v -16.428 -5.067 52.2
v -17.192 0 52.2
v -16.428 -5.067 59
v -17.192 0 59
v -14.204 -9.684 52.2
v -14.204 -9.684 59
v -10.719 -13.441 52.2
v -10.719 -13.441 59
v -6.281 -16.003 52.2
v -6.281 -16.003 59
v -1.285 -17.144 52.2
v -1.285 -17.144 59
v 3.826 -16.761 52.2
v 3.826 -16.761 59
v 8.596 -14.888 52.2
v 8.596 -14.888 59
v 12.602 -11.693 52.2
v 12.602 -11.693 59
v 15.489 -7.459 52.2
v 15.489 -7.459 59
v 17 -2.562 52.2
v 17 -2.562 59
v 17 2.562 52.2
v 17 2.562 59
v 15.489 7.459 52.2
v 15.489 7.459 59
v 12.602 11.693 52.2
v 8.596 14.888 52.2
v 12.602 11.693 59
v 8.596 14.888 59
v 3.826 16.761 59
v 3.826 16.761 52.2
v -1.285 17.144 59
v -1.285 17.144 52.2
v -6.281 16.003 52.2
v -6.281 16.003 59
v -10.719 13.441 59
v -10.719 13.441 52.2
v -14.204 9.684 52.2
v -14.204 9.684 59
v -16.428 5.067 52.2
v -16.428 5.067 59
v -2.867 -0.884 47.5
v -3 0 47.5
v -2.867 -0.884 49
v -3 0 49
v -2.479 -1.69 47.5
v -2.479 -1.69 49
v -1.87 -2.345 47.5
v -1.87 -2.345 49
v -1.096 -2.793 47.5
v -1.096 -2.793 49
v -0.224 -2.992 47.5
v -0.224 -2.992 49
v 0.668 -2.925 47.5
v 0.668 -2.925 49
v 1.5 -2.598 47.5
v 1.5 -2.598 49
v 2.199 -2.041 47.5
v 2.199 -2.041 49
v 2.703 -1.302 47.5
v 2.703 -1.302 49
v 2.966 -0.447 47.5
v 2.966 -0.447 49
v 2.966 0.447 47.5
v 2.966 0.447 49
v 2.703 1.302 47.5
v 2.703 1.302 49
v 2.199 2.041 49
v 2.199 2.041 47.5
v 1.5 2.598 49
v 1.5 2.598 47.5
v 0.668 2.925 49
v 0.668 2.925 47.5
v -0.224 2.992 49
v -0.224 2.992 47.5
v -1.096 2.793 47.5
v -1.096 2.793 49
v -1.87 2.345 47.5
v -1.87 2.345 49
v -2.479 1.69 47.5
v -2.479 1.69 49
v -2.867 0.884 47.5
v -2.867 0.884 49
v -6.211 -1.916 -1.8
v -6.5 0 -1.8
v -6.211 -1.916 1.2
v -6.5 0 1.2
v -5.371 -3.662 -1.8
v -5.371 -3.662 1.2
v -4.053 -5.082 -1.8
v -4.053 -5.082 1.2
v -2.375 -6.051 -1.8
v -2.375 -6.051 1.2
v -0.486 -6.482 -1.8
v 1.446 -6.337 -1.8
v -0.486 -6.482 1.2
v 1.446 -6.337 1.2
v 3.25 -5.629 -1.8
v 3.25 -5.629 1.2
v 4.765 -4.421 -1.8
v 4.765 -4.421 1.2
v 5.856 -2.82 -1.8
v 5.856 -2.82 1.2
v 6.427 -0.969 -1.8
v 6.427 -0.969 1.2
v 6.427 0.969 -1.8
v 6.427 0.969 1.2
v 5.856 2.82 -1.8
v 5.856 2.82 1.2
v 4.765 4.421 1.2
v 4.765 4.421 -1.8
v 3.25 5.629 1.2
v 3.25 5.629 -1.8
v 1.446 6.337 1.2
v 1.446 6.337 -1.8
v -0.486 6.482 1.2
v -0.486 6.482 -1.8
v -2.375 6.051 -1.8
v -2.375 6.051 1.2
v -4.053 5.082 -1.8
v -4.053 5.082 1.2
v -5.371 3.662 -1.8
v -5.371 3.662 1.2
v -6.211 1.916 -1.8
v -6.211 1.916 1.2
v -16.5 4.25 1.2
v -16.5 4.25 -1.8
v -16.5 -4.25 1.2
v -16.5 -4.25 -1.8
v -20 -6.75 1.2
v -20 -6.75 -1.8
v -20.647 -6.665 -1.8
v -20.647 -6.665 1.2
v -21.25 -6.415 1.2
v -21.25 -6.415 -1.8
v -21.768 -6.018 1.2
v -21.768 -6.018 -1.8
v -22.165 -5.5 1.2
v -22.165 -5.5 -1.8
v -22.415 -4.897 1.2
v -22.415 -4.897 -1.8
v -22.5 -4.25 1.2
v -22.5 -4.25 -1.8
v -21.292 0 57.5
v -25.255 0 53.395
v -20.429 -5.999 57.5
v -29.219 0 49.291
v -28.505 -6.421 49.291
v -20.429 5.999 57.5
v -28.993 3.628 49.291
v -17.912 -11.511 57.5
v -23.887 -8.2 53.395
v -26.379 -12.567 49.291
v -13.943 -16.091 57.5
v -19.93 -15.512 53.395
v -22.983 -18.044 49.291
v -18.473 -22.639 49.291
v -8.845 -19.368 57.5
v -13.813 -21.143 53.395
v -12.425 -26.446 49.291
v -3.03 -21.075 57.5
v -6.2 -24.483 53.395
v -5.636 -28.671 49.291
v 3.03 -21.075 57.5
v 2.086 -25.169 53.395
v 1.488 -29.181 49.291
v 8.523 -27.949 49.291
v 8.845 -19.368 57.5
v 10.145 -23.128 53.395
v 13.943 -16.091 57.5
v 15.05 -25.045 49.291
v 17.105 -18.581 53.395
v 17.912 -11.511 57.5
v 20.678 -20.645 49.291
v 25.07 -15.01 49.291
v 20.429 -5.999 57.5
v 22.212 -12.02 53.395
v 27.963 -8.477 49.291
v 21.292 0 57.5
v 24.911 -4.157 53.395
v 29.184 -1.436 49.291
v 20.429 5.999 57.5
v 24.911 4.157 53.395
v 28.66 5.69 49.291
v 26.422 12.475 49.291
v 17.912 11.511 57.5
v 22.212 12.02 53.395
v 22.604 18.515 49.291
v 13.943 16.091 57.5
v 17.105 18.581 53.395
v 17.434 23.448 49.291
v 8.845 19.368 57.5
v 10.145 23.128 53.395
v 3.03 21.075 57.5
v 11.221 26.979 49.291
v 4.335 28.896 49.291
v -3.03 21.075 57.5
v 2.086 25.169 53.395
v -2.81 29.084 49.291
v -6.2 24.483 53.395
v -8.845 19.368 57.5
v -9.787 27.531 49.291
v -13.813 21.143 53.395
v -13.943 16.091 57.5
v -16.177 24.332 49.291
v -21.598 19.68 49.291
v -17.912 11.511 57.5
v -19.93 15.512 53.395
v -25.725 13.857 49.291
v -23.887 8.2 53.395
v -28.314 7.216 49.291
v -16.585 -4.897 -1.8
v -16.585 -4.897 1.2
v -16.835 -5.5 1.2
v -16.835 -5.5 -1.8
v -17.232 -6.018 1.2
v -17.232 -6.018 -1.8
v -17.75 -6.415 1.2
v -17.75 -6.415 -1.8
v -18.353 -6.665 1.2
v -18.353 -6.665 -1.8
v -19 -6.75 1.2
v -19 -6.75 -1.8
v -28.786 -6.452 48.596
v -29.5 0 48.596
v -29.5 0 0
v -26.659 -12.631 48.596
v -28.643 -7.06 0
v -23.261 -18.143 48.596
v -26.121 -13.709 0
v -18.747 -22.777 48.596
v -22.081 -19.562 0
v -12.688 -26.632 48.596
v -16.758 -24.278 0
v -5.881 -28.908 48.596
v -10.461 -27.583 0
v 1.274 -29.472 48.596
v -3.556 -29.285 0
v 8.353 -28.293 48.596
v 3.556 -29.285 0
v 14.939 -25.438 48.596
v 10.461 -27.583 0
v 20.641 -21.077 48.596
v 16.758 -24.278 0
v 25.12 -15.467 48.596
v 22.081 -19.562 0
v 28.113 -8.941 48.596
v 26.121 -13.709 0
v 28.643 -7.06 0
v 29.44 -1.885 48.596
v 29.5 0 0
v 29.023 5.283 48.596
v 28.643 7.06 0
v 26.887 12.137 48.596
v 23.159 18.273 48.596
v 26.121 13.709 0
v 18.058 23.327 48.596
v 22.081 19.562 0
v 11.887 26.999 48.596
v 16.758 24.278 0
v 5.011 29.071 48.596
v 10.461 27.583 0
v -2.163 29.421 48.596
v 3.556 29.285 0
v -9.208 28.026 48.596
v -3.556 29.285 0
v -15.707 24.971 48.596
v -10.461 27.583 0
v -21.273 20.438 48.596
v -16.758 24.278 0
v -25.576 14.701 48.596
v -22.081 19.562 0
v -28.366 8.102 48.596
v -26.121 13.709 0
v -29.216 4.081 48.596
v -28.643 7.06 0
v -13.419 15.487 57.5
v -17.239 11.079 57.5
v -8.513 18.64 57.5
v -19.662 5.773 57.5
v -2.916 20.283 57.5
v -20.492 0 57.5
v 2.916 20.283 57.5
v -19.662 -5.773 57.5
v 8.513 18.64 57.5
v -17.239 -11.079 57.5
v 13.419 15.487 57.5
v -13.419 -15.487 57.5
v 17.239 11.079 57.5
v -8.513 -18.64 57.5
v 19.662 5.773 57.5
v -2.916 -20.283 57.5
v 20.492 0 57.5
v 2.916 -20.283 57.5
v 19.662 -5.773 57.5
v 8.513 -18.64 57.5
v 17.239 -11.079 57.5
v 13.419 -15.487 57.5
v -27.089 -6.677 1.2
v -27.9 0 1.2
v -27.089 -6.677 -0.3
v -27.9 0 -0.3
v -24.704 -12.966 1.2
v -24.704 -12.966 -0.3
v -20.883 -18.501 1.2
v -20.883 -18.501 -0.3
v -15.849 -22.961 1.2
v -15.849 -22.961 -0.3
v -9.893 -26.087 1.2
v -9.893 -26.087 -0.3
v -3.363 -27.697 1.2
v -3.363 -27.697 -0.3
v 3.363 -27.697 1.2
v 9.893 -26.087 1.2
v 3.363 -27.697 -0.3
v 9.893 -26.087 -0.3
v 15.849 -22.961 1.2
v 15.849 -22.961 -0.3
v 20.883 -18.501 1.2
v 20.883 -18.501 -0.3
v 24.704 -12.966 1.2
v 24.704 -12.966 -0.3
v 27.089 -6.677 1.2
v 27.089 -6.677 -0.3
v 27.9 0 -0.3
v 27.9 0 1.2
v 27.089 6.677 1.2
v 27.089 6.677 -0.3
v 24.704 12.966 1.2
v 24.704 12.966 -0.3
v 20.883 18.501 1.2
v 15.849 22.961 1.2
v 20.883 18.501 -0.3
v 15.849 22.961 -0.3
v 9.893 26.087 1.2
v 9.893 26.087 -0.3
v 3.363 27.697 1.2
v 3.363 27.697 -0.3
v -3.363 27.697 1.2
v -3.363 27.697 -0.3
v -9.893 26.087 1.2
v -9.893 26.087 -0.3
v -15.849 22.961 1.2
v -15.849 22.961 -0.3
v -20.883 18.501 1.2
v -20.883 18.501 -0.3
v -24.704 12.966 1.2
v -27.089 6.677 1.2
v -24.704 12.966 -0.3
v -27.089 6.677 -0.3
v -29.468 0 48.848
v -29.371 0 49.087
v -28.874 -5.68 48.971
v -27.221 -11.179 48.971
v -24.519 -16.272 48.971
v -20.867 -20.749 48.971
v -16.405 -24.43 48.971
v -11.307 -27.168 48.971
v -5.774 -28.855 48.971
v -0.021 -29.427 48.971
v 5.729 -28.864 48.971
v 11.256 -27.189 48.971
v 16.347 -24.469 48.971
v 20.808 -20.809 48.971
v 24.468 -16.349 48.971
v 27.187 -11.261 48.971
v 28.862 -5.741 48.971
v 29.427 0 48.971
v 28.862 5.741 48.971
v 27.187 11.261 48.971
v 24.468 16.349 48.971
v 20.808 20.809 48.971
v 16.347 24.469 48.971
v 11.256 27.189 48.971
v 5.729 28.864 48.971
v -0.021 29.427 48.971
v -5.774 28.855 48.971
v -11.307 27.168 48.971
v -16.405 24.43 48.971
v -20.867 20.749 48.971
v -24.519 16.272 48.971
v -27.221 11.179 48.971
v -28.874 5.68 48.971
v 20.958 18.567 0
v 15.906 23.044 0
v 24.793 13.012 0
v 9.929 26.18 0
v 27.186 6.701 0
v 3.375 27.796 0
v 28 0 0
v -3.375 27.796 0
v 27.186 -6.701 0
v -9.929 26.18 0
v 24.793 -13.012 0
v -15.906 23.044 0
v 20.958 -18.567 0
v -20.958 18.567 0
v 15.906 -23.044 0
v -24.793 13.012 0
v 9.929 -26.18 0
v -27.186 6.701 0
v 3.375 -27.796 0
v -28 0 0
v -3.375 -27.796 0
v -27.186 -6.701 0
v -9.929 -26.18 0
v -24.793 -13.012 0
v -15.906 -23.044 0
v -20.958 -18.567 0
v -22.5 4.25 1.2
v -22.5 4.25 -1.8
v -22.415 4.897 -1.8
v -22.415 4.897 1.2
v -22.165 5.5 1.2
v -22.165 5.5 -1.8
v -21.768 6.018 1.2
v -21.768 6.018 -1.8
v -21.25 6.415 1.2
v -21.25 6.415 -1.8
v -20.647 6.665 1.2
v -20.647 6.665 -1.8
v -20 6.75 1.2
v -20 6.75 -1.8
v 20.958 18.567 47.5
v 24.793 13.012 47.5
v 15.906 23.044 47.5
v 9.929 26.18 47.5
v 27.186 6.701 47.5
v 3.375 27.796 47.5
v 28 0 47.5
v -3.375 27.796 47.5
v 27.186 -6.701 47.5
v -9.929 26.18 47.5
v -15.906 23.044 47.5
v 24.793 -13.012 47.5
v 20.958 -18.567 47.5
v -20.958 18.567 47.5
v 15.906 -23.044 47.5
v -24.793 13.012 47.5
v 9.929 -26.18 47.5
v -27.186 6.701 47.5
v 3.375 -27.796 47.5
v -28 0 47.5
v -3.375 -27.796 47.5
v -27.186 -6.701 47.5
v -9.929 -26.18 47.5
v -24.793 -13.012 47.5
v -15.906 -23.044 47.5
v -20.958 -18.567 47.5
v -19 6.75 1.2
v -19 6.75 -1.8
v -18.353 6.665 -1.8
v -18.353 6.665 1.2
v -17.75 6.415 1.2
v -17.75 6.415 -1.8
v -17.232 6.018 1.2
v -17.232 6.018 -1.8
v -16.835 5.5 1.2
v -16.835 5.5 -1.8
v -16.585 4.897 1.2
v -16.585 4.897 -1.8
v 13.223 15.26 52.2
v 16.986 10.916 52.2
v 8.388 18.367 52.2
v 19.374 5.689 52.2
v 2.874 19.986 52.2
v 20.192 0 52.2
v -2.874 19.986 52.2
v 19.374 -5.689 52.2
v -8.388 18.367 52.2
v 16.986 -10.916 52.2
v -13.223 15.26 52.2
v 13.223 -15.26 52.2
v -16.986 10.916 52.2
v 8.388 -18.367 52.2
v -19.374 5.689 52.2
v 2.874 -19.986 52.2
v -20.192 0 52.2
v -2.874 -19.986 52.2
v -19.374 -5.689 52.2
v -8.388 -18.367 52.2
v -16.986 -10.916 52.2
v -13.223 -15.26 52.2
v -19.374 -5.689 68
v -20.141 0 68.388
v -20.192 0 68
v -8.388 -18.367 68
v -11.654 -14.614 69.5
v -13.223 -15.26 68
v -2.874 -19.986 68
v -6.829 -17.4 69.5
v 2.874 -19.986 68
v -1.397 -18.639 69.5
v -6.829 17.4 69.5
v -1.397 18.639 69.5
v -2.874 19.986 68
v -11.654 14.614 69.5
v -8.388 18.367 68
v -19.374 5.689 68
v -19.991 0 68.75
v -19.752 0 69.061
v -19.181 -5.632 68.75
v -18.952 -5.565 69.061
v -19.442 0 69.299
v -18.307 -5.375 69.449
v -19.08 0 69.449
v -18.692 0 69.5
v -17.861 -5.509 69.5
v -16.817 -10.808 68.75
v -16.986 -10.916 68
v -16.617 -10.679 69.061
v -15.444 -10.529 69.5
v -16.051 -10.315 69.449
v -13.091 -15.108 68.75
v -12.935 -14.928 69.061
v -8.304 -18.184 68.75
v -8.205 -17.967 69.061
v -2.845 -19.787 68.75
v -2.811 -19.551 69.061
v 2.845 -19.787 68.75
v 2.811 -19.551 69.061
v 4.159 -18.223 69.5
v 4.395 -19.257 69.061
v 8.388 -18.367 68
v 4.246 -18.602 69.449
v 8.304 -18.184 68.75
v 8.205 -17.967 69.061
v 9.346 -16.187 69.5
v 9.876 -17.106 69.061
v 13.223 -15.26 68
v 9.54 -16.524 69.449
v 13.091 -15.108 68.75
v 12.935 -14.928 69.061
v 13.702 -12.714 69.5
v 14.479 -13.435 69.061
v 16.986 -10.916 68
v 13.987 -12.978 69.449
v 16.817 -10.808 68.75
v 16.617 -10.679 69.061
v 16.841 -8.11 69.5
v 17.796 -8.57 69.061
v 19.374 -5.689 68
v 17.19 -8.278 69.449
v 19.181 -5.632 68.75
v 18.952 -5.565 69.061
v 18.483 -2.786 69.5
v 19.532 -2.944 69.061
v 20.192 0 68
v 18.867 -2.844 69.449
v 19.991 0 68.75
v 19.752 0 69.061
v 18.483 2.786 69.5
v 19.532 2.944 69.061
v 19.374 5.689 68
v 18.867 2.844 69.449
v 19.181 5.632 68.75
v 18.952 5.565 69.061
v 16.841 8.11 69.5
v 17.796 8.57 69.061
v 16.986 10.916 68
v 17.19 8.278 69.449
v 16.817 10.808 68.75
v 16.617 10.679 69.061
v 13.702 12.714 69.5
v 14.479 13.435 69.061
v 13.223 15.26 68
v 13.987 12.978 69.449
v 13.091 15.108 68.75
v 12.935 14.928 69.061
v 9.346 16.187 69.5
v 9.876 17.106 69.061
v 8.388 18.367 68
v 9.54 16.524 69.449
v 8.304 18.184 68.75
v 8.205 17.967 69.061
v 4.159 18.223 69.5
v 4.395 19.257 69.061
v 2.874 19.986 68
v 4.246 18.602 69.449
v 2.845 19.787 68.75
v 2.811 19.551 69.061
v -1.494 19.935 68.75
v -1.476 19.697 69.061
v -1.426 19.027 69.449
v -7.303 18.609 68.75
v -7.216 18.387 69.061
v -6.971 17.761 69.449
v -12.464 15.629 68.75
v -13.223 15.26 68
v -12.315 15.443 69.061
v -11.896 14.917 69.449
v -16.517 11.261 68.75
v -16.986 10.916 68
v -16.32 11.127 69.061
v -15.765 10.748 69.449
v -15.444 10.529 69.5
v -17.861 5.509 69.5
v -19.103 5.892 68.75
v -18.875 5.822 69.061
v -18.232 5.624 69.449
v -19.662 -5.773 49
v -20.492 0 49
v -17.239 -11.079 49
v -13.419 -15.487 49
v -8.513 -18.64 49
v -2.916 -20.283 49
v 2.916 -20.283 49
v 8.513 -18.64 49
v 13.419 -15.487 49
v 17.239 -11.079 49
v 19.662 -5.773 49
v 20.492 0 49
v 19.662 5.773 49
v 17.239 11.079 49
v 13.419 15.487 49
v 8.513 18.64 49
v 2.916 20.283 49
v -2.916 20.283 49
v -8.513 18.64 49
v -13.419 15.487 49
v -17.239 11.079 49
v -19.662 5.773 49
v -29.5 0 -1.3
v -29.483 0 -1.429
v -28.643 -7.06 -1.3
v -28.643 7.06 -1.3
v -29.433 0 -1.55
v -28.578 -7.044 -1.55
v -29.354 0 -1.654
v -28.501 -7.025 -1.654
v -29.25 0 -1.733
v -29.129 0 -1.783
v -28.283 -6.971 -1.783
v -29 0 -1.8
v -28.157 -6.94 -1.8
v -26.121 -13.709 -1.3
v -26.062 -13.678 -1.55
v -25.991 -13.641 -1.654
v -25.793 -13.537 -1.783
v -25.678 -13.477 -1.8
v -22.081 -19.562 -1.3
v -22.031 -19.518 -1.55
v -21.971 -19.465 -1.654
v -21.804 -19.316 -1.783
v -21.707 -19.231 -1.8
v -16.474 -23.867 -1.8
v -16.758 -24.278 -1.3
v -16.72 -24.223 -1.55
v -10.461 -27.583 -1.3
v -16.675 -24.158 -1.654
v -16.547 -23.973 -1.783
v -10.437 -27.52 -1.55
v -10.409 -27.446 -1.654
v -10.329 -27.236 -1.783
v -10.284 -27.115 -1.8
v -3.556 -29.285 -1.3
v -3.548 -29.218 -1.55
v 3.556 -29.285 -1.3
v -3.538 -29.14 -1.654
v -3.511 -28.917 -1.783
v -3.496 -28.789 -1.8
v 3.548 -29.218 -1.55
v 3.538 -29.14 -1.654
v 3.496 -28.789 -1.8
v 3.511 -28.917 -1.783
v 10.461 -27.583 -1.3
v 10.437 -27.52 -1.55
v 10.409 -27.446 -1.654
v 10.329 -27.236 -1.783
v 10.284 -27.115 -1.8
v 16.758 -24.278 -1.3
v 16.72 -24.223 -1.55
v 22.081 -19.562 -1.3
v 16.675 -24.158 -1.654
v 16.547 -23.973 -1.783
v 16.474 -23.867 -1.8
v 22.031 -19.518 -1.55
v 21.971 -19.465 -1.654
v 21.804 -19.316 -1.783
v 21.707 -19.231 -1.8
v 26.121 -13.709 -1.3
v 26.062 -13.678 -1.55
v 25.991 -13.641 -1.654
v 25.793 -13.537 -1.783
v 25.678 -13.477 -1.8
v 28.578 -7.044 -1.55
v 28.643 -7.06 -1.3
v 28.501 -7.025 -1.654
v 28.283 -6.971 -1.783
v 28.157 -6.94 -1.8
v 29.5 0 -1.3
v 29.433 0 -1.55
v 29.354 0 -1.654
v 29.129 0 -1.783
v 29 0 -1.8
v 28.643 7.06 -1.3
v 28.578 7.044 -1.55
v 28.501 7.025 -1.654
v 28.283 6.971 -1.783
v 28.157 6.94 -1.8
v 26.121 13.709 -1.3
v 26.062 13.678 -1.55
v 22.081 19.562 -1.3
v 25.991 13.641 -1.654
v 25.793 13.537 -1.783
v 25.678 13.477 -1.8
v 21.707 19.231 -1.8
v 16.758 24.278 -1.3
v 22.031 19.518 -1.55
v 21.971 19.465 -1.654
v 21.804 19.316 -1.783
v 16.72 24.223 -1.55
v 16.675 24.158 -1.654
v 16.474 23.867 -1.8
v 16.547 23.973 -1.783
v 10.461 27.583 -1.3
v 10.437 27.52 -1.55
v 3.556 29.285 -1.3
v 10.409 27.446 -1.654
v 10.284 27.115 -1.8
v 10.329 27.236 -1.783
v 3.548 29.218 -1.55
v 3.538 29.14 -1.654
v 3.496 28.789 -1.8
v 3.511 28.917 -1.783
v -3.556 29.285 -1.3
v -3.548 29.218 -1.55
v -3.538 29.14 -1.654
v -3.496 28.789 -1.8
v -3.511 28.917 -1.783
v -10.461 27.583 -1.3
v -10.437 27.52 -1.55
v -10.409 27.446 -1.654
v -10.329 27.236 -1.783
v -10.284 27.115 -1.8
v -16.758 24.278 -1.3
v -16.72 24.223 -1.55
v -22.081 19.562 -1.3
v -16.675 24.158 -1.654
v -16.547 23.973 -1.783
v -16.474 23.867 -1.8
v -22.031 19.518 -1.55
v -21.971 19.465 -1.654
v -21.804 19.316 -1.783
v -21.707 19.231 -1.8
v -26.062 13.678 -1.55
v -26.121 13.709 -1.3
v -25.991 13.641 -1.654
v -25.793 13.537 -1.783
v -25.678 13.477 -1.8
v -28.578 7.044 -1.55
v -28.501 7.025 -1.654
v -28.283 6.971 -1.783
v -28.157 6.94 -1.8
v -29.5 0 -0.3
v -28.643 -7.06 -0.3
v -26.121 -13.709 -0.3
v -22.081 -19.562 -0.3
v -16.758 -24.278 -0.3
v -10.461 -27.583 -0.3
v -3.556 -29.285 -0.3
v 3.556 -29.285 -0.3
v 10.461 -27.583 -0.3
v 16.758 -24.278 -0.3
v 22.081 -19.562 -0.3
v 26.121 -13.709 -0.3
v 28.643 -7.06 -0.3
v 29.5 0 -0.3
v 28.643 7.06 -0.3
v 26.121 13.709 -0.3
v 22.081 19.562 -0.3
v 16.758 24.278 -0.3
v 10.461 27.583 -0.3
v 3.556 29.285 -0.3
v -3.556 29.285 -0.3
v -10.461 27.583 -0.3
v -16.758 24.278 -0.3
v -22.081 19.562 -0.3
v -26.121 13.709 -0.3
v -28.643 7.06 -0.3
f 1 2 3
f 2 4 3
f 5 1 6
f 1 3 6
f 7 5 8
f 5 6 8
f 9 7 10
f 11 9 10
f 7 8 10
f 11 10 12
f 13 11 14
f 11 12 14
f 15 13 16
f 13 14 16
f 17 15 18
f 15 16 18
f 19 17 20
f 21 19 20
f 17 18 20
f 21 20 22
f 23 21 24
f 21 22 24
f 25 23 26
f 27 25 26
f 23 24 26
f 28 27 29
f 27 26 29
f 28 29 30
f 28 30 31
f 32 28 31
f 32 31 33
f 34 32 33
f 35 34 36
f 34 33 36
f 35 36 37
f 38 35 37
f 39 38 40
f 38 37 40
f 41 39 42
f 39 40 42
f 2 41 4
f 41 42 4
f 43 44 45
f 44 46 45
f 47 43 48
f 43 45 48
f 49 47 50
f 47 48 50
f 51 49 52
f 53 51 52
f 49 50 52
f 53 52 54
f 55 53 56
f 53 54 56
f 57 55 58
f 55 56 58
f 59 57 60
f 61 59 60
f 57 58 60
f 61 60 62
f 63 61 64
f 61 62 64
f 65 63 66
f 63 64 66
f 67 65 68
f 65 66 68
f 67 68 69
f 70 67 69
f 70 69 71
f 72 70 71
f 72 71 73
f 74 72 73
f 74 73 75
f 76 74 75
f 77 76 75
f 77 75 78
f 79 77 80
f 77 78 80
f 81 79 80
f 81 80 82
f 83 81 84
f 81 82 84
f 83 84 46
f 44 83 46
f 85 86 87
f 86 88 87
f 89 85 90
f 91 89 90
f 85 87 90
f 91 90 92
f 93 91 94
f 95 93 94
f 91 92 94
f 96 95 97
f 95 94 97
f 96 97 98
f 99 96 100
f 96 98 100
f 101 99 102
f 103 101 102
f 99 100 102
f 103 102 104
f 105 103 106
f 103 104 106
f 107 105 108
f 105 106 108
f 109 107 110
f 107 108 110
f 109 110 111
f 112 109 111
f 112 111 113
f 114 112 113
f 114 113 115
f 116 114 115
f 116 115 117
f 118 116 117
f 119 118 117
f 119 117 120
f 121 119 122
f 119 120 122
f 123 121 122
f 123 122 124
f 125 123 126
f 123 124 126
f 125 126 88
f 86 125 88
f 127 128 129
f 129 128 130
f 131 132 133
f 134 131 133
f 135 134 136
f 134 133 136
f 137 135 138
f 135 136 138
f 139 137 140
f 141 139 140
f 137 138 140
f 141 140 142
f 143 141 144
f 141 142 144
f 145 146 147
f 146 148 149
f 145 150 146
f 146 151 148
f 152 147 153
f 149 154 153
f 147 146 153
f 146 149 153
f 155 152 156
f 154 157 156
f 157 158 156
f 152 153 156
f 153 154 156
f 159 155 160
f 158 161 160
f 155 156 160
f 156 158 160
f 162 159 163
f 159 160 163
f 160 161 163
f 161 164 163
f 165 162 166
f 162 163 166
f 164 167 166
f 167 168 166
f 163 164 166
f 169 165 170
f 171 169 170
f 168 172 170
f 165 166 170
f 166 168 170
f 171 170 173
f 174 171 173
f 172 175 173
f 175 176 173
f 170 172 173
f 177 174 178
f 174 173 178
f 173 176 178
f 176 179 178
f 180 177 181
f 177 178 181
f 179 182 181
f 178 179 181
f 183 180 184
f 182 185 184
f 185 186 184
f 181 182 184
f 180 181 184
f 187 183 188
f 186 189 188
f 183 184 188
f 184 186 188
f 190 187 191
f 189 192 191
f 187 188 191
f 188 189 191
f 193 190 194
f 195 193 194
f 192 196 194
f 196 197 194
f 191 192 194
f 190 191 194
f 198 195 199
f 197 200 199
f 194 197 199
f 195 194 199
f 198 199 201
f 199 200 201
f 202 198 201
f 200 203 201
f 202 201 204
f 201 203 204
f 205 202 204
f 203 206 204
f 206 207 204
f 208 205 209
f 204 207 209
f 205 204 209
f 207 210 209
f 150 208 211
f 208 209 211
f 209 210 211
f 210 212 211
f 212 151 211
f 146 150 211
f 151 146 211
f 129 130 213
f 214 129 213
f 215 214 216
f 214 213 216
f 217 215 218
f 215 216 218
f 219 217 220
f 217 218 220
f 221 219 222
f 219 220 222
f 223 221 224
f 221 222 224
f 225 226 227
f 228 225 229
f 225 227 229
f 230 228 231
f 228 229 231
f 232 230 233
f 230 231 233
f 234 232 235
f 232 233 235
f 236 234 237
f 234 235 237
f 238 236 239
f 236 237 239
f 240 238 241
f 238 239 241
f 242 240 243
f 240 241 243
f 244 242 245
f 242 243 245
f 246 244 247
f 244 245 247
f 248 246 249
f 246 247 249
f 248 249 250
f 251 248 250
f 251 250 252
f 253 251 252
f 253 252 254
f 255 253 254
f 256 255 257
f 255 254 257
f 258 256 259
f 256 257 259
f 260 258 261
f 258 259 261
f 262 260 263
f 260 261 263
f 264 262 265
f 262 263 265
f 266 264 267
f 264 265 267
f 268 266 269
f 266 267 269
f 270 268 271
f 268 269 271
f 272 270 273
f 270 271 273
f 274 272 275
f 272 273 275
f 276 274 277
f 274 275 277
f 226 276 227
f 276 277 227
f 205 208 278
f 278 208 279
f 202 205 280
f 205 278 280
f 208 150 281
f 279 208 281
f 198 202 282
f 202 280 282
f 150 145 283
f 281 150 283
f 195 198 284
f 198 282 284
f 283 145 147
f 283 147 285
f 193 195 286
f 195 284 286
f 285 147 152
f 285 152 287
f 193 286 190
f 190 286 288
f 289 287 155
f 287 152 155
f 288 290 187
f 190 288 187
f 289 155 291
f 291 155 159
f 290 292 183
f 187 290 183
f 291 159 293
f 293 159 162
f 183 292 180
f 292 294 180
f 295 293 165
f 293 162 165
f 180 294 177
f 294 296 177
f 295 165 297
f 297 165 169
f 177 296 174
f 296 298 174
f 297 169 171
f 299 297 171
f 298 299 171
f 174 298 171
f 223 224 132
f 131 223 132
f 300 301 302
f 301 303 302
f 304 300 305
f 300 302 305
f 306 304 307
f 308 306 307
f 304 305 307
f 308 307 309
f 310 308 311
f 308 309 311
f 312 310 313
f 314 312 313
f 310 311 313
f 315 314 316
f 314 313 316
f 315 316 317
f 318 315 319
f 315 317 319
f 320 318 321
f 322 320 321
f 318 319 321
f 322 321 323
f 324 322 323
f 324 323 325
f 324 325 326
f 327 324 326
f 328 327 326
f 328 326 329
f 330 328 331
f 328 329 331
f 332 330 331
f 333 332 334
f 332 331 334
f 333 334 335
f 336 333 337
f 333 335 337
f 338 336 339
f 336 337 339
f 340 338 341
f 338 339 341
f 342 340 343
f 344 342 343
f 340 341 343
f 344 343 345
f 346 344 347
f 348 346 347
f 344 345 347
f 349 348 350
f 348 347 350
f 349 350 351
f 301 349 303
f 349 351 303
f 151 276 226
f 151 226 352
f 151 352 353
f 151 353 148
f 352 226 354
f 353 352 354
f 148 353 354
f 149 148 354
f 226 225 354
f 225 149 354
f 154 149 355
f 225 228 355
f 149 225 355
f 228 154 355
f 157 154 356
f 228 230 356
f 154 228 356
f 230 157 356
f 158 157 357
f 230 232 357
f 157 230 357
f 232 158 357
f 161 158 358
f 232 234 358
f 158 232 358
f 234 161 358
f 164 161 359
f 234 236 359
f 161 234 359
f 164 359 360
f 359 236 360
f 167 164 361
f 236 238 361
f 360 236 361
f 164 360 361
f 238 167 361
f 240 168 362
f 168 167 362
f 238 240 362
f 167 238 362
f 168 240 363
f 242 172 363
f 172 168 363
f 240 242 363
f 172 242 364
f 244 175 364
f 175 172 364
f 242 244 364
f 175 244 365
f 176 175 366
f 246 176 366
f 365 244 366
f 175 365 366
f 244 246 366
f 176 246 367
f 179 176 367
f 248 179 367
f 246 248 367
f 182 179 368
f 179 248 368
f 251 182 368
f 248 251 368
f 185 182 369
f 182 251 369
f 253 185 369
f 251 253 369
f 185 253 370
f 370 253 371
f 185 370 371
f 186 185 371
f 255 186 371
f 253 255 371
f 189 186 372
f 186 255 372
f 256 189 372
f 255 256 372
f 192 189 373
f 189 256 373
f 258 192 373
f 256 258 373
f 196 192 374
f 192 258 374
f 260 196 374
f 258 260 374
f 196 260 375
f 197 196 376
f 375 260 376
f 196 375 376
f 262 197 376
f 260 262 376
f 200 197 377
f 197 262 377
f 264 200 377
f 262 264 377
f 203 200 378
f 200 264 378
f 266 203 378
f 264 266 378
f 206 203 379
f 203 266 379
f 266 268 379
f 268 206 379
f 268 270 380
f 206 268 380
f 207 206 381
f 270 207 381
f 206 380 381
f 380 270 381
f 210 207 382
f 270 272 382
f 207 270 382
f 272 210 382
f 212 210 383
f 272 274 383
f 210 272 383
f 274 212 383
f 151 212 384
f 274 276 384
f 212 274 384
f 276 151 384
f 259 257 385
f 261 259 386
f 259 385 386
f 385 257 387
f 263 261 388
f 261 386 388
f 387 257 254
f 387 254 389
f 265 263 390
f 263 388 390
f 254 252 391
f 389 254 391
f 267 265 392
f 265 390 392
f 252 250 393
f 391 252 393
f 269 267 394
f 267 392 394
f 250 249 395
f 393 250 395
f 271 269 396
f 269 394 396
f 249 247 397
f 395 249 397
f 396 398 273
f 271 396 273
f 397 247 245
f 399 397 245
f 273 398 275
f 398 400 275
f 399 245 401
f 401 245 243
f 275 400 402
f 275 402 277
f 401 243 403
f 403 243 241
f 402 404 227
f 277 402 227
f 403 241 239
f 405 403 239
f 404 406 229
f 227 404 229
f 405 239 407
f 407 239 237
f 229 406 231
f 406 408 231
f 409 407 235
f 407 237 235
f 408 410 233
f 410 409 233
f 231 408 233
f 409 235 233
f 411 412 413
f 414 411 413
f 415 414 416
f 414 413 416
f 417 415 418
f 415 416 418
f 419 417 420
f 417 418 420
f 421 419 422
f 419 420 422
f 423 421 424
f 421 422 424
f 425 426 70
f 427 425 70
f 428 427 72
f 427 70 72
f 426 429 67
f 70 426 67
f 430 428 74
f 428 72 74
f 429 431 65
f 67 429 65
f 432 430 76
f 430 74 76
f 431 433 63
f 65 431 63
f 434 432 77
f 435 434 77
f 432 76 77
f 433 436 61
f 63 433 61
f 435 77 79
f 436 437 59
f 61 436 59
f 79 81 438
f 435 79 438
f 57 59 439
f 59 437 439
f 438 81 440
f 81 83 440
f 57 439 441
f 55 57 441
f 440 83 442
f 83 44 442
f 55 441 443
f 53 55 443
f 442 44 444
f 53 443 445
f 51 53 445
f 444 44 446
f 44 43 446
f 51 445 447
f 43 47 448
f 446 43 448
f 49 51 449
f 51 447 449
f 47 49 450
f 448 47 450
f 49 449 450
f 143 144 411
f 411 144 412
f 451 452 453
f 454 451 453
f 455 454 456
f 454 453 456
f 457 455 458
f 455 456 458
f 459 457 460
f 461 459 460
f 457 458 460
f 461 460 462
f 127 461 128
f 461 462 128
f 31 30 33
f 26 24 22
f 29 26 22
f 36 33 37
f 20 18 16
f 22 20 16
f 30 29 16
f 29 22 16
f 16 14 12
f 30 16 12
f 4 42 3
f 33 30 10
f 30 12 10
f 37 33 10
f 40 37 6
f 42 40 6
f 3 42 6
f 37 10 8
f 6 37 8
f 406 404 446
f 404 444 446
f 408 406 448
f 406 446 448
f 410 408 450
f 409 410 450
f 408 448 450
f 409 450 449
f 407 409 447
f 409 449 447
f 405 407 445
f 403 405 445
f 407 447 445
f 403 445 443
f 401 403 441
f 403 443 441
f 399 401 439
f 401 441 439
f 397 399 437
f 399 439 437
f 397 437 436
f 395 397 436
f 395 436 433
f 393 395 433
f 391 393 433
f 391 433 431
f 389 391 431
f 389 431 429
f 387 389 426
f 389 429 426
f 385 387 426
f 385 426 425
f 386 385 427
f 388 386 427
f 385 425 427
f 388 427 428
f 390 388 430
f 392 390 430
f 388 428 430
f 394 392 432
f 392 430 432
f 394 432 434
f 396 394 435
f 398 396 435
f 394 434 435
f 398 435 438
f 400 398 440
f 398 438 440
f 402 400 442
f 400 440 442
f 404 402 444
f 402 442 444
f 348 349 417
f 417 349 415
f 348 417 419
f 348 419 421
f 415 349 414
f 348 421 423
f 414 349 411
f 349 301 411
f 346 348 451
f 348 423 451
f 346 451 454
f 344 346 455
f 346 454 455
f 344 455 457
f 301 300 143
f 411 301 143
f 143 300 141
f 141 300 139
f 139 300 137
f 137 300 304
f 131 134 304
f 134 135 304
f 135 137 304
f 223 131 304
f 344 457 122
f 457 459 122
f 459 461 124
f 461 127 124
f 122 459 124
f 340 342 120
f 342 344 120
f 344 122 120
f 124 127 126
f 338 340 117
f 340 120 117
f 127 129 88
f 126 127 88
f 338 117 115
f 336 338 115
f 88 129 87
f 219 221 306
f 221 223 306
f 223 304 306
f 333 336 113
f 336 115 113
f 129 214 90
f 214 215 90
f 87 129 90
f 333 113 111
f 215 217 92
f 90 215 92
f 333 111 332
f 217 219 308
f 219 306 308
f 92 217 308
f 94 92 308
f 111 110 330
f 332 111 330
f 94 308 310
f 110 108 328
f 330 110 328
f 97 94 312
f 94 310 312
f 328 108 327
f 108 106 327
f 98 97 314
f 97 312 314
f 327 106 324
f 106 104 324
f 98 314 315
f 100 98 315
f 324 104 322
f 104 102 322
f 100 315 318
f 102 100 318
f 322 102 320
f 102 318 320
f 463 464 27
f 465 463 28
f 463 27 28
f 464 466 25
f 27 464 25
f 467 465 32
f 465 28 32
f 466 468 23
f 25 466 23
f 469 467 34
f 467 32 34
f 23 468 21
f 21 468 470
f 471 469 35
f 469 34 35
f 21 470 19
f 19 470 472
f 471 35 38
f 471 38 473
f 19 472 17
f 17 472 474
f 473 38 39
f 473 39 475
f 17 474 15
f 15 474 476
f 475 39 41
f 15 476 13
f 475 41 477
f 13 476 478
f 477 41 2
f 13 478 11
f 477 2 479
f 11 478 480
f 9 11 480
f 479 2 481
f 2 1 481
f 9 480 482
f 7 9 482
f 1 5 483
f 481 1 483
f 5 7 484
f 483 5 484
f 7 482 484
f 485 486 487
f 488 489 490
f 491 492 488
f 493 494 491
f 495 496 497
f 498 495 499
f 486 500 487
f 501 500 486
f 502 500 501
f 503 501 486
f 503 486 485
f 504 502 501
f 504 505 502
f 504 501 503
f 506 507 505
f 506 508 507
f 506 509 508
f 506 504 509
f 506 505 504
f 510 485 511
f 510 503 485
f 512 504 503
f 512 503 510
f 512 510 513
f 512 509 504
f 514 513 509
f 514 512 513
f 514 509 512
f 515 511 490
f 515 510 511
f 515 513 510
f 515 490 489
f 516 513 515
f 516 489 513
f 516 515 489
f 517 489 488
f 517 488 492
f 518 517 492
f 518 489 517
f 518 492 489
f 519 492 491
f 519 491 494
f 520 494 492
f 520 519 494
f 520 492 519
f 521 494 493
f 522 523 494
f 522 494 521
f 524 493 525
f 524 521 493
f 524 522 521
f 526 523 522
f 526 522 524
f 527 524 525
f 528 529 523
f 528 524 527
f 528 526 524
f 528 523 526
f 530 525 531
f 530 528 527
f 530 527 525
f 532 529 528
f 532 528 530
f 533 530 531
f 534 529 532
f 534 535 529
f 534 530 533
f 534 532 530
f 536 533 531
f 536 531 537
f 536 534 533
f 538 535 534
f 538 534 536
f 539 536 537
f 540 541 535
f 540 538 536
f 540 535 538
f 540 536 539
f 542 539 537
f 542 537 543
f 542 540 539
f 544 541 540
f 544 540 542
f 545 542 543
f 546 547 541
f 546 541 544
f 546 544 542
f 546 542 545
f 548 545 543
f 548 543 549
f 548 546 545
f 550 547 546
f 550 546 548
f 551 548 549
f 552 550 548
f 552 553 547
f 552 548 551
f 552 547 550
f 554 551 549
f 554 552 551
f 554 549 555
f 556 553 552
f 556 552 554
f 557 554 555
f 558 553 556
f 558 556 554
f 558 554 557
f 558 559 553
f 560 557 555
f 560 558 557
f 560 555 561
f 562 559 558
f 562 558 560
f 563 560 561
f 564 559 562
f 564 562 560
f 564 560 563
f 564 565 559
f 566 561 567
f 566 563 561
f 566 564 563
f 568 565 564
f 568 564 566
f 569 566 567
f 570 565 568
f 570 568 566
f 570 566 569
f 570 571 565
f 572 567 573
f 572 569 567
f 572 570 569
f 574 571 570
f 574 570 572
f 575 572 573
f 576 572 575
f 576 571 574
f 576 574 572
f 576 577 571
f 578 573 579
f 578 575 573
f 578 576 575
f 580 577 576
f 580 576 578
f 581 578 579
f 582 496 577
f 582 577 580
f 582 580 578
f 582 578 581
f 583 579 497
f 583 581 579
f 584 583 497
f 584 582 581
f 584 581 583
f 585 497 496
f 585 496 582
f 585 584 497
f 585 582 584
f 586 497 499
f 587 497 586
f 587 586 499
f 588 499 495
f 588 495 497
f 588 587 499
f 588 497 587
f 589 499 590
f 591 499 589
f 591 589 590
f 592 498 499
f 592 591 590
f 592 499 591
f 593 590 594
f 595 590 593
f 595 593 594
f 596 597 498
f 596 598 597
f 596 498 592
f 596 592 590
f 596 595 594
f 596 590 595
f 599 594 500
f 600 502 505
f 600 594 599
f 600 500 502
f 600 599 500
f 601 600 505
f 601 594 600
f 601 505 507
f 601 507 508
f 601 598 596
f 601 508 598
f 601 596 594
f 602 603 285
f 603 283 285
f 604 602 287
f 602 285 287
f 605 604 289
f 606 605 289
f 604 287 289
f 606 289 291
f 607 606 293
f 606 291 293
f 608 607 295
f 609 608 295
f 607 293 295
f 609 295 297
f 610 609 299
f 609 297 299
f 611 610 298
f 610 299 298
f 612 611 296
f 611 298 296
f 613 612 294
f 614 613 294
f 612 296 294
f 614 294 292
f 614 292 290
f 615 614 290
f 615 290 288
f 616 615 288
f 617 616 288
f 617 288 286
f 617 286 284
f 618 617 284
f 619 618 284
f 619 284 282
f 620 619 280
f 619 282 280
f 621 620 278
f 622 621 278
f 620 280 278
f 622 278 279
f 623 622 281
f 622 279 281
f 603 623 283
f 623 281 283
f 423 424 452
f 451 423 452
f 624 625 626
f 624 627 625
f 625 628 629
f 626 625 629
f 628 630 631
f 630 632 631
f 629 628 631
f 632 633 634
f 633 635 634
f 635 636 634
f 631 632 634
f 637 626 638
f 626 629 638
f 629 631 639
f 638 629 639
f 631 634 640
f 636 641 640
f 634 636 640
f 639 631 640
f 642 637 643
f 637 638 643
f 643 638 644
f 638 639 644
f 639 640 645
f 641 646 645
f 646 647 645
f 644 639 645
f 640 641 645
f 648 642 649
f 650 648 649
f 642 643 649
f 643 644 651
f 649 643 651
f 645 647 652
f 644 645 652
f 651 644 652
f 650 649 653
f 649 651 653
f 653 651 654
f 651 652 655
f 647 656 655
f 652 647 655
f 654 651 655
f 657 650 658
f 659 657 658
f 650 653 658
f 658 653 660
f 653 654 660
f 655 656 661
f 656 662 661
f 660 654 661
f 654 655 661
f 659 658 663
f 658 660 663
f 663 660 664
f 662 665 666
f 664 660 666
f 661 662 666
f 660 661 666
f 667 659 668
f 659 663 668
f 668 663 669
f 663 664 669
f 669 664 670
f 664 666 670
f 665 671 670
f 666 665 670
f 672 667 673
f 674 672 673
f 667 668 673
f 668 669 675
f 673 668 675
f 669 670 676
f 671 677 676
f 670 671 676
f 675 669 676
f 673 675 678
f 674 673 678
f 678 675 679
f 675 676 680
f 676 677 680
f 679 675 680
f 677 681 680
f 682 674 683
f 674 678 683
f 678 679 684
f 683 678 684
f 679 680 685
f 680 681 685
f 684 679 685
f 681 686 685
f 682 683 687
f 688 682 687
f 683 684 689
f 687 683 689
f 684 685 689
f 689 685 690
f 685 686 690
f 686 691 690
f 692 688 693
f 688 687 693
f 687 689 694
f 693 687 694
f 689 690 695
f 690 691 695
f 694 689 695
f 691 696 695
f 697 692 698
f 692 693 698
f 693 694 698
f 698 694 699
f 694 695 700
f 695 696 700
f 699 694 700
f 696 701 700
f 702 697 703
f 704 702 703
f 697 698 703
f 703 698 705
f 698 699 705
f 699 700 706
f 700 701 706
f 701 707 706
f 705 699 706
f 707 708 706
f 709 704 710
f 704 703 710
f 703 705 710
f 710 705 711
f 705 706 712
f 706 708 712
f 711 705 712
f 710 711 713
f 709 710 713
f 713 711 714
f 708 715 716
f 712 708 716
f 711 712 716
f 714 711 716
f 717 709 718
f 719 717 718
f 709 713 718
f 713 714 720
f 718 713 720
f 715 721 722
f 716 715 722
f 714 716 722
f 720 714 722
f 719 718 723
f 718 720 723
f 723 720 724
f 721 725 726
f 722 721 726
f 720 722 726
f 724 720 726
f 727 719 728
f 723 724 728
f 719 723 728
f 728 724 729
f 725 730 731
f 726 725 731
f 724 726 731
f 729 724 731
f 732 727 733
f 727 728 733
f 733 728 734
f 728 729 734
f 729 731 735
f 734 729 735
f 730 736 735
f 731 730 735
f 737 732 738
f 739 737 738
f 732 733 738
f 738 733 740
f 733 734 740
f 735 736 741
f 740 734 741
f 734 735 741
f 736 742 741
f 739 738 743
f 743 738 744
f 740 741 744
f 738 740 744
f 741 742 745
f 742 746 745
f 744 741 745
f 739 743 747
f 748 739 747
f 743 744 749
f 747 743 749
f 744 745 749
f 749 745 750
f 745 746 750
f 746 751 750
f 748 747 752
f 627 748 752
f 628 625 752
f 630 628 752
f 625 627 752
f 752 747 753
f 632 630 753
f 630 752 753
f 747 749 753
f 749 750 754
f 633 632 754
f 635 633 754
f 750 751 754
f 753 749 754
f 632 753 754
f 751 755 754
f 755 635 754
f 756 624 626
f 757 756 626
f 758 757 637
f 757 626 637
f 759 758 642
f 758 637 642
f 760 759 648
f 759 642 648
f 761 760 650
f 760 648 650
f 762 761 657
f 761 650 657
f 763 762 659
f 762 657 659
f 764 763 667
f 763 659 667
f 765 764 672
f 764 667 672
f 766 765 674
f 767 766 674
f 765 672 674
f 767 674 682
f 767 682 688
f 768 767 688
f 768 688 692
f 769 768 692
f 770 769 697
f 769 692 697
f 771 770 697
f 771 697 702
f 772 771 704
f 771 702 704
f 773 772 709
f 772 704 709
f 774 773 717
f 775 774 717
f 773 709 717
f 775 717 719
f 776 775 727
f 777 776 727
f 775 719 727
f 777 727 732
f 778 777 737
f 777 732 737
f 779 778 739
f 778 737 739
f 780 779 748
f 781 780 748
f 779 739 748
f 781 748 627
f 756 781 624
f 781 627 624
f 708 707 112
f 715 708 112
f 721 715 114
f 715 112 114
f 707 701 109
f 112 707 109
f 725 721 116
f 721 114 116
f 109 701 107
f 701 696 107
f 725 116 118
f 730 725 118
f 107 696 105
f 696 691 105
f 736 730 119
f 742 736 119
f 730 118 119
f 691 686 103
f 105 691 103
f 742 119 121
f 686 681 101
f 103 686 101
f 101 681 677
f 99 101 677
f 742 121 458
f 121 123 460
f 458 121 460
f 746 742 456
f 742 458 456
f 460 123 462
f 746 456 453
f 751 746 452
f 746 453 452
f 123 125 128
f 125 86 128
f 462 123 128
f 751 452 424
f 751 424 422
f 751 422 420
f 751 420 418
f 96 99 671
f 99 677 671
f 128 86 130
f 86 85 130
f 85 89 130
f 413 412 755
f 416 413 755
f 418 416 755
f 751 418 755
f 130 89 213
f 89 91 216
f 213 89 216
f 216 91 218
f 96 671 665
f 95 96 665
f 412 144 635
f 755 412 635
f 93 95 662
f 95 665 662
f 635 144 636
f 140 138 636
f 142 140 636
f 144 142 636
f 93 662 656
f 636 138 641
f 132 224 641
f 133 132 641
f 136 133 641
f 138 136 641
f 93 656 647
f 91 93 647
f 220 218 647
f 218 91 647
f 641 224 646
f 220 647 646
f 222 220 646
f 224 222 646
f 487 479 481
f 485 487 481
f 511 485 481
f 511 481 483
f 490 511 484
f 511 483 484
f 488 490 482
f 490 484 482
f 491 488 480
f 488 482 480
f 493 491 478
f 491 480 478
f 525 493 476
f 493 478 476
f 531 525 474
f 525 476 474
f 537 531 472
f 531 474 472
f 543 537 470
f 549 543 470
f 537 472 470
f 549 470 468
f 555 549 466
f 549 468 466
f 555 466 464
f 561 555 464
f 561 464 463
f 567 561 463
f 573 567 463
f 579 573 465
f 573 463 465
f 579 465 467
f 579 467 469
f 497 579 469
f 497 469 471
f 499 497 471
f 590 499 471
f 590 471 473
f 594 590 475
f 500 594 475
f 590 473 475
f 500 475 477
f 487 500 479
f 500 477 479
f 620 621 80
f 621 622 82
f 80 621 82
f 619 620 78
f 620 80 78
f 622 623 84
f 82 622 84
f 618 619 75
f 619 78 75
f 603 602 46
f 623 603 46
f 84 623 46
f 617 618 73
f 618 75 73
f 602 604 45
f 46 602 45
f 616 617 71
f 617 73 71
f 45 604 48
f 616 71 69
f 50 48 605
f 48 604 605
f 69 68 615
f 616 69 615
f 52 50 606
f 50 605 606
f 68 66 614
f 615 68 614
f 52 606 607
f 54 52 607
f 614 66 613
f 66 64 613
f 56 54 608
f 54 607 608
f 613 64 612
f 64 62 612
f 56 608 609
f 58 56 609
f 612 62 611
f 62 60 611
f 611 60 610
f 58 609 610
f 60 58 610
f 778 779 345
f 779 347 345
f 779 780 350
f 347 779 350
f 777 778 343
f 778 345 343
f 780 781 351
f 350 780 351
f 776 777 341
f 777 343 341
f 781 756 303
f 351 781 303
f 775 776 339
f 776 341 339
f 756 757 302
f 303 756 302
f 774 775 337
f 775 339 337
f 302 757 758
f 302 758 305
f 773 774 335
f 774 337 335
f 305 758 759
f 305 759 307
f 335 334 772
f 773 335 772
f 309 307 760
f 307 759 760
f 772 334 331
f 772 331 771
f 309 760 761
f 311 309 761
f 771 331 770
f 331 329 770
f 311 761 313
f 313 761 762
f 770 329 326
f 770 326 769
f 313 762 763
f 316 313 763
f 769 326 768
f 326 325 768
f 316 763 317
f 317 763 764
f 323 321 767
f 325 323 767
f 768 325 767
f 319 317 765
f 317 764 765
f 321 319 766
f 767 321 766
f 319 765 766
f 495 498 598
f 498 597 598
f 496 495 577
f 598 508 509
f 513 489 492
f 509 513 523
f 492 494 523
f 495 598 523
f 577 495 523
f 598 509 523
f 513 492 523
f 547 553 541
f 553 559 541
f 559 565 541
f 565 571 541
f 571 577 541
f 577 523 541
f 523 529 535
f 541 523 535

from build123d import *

# Parameters (mm, degrees)
F5_R      = 1.5
F6_R      = 1
F10_DEPTH = 25
F11_R     = 0.5


with BuildPart() as f2:
    # F1 (on Front) → F2 (revolve)
    with BuildSketch(Plane.XZ):
        Polygon((-29.5, 49), (-29.5, 0), (-28, 0), (-28, 47.5), (-20.491645, 47.5), (-3, 47.5), (-3, 49), (-20.491645, 49), (-20.491645, 57.5), (-21.291645, 57.5), align=None)
    revolve(axis=Axis((0, 0, 33.901792), (0, 0, 1)))

    # F6
    f6_edges = [f2.edges().sort_by_distance(p)[0] for p in [
        (29.5, 0, 49),
    ]]
    fillet(f6_edges, radius=F6_R)


with BuildPart() as f4:
    # F3 (on Front) → F4 (revolve)
    with BuildSketch(Plane.XZ):
        Polygon((-20.191645, 69.5), (-20.191645, 52.2), (-17.191645, 52.2), (-17.191645, 59), (0, 59), (0, 69.5), align=None)
    revolve(axis=Axis((0, 0, 33.901792), (0, 0, 1)))

    # F5
    f5_edges = [f4.edges().sort_by_distance(p)[0] for p in [
        (20.191645, 0, 69.5),
    ]]
    fillet(f5_edges, radius=F5_R)


with BuildPart() as f8:
    # F7 (on Front) → F8 (revolve)
    with BuildSketch(Plane.XZ):
        Polygon((-29.5, -0.3), (-29.5, -1.8), (-6.5, -1.8), (-6.5, 1.2), (-27.9, 1.2), (-27.9, -0.3), align=None)
    revolve(axis=Axis((0, 0, 33.901792), (0, 0, 1)))

    # F9 (on face) → F10 (cut)
    with BuildSketch(Plane(origin=(0, 0, -1.8), x_dir=(1, 0, 0), z_dir=(0, 0, -1))):
        with BuildLine():
            ThreePointArc((-22.5, -4.25), (-21.767767, -6.017767), (-20, -6.75))
            Line((-20, -6.75), (-19, -6.75))
            ThreePointArc((-19, -6.75), (-17.232233, -6.017767), (-16.5, -4.25))
            Line((-16.5, -4.25), (-16.5, 4.25))
            ThreePointArc((-16.5, 4.25), (-17.232233, 6.017767), (-19, 6.75))
            Line((-19, 6.75), (-20, 6.75))
            ThreePointArc((-20, 6.75), (-21.767767, 6.017767), (-22.5, 4.25))
            Line((-22.5, 4.25), (-22.5, -4.25))
        make_face()
    extrude(amount=-F10_DEPTH, mode=Mode.SUBTRACT)

    # F11
    f11_edges = [f8.edges().sort_by_distance(p)[0] for p in [
        (29.5, 0, -1.8),
    ]]
    fillet(f11_edges, radius=F11_R)


solid = Compound([f2.part, f4.part, f8.part])
